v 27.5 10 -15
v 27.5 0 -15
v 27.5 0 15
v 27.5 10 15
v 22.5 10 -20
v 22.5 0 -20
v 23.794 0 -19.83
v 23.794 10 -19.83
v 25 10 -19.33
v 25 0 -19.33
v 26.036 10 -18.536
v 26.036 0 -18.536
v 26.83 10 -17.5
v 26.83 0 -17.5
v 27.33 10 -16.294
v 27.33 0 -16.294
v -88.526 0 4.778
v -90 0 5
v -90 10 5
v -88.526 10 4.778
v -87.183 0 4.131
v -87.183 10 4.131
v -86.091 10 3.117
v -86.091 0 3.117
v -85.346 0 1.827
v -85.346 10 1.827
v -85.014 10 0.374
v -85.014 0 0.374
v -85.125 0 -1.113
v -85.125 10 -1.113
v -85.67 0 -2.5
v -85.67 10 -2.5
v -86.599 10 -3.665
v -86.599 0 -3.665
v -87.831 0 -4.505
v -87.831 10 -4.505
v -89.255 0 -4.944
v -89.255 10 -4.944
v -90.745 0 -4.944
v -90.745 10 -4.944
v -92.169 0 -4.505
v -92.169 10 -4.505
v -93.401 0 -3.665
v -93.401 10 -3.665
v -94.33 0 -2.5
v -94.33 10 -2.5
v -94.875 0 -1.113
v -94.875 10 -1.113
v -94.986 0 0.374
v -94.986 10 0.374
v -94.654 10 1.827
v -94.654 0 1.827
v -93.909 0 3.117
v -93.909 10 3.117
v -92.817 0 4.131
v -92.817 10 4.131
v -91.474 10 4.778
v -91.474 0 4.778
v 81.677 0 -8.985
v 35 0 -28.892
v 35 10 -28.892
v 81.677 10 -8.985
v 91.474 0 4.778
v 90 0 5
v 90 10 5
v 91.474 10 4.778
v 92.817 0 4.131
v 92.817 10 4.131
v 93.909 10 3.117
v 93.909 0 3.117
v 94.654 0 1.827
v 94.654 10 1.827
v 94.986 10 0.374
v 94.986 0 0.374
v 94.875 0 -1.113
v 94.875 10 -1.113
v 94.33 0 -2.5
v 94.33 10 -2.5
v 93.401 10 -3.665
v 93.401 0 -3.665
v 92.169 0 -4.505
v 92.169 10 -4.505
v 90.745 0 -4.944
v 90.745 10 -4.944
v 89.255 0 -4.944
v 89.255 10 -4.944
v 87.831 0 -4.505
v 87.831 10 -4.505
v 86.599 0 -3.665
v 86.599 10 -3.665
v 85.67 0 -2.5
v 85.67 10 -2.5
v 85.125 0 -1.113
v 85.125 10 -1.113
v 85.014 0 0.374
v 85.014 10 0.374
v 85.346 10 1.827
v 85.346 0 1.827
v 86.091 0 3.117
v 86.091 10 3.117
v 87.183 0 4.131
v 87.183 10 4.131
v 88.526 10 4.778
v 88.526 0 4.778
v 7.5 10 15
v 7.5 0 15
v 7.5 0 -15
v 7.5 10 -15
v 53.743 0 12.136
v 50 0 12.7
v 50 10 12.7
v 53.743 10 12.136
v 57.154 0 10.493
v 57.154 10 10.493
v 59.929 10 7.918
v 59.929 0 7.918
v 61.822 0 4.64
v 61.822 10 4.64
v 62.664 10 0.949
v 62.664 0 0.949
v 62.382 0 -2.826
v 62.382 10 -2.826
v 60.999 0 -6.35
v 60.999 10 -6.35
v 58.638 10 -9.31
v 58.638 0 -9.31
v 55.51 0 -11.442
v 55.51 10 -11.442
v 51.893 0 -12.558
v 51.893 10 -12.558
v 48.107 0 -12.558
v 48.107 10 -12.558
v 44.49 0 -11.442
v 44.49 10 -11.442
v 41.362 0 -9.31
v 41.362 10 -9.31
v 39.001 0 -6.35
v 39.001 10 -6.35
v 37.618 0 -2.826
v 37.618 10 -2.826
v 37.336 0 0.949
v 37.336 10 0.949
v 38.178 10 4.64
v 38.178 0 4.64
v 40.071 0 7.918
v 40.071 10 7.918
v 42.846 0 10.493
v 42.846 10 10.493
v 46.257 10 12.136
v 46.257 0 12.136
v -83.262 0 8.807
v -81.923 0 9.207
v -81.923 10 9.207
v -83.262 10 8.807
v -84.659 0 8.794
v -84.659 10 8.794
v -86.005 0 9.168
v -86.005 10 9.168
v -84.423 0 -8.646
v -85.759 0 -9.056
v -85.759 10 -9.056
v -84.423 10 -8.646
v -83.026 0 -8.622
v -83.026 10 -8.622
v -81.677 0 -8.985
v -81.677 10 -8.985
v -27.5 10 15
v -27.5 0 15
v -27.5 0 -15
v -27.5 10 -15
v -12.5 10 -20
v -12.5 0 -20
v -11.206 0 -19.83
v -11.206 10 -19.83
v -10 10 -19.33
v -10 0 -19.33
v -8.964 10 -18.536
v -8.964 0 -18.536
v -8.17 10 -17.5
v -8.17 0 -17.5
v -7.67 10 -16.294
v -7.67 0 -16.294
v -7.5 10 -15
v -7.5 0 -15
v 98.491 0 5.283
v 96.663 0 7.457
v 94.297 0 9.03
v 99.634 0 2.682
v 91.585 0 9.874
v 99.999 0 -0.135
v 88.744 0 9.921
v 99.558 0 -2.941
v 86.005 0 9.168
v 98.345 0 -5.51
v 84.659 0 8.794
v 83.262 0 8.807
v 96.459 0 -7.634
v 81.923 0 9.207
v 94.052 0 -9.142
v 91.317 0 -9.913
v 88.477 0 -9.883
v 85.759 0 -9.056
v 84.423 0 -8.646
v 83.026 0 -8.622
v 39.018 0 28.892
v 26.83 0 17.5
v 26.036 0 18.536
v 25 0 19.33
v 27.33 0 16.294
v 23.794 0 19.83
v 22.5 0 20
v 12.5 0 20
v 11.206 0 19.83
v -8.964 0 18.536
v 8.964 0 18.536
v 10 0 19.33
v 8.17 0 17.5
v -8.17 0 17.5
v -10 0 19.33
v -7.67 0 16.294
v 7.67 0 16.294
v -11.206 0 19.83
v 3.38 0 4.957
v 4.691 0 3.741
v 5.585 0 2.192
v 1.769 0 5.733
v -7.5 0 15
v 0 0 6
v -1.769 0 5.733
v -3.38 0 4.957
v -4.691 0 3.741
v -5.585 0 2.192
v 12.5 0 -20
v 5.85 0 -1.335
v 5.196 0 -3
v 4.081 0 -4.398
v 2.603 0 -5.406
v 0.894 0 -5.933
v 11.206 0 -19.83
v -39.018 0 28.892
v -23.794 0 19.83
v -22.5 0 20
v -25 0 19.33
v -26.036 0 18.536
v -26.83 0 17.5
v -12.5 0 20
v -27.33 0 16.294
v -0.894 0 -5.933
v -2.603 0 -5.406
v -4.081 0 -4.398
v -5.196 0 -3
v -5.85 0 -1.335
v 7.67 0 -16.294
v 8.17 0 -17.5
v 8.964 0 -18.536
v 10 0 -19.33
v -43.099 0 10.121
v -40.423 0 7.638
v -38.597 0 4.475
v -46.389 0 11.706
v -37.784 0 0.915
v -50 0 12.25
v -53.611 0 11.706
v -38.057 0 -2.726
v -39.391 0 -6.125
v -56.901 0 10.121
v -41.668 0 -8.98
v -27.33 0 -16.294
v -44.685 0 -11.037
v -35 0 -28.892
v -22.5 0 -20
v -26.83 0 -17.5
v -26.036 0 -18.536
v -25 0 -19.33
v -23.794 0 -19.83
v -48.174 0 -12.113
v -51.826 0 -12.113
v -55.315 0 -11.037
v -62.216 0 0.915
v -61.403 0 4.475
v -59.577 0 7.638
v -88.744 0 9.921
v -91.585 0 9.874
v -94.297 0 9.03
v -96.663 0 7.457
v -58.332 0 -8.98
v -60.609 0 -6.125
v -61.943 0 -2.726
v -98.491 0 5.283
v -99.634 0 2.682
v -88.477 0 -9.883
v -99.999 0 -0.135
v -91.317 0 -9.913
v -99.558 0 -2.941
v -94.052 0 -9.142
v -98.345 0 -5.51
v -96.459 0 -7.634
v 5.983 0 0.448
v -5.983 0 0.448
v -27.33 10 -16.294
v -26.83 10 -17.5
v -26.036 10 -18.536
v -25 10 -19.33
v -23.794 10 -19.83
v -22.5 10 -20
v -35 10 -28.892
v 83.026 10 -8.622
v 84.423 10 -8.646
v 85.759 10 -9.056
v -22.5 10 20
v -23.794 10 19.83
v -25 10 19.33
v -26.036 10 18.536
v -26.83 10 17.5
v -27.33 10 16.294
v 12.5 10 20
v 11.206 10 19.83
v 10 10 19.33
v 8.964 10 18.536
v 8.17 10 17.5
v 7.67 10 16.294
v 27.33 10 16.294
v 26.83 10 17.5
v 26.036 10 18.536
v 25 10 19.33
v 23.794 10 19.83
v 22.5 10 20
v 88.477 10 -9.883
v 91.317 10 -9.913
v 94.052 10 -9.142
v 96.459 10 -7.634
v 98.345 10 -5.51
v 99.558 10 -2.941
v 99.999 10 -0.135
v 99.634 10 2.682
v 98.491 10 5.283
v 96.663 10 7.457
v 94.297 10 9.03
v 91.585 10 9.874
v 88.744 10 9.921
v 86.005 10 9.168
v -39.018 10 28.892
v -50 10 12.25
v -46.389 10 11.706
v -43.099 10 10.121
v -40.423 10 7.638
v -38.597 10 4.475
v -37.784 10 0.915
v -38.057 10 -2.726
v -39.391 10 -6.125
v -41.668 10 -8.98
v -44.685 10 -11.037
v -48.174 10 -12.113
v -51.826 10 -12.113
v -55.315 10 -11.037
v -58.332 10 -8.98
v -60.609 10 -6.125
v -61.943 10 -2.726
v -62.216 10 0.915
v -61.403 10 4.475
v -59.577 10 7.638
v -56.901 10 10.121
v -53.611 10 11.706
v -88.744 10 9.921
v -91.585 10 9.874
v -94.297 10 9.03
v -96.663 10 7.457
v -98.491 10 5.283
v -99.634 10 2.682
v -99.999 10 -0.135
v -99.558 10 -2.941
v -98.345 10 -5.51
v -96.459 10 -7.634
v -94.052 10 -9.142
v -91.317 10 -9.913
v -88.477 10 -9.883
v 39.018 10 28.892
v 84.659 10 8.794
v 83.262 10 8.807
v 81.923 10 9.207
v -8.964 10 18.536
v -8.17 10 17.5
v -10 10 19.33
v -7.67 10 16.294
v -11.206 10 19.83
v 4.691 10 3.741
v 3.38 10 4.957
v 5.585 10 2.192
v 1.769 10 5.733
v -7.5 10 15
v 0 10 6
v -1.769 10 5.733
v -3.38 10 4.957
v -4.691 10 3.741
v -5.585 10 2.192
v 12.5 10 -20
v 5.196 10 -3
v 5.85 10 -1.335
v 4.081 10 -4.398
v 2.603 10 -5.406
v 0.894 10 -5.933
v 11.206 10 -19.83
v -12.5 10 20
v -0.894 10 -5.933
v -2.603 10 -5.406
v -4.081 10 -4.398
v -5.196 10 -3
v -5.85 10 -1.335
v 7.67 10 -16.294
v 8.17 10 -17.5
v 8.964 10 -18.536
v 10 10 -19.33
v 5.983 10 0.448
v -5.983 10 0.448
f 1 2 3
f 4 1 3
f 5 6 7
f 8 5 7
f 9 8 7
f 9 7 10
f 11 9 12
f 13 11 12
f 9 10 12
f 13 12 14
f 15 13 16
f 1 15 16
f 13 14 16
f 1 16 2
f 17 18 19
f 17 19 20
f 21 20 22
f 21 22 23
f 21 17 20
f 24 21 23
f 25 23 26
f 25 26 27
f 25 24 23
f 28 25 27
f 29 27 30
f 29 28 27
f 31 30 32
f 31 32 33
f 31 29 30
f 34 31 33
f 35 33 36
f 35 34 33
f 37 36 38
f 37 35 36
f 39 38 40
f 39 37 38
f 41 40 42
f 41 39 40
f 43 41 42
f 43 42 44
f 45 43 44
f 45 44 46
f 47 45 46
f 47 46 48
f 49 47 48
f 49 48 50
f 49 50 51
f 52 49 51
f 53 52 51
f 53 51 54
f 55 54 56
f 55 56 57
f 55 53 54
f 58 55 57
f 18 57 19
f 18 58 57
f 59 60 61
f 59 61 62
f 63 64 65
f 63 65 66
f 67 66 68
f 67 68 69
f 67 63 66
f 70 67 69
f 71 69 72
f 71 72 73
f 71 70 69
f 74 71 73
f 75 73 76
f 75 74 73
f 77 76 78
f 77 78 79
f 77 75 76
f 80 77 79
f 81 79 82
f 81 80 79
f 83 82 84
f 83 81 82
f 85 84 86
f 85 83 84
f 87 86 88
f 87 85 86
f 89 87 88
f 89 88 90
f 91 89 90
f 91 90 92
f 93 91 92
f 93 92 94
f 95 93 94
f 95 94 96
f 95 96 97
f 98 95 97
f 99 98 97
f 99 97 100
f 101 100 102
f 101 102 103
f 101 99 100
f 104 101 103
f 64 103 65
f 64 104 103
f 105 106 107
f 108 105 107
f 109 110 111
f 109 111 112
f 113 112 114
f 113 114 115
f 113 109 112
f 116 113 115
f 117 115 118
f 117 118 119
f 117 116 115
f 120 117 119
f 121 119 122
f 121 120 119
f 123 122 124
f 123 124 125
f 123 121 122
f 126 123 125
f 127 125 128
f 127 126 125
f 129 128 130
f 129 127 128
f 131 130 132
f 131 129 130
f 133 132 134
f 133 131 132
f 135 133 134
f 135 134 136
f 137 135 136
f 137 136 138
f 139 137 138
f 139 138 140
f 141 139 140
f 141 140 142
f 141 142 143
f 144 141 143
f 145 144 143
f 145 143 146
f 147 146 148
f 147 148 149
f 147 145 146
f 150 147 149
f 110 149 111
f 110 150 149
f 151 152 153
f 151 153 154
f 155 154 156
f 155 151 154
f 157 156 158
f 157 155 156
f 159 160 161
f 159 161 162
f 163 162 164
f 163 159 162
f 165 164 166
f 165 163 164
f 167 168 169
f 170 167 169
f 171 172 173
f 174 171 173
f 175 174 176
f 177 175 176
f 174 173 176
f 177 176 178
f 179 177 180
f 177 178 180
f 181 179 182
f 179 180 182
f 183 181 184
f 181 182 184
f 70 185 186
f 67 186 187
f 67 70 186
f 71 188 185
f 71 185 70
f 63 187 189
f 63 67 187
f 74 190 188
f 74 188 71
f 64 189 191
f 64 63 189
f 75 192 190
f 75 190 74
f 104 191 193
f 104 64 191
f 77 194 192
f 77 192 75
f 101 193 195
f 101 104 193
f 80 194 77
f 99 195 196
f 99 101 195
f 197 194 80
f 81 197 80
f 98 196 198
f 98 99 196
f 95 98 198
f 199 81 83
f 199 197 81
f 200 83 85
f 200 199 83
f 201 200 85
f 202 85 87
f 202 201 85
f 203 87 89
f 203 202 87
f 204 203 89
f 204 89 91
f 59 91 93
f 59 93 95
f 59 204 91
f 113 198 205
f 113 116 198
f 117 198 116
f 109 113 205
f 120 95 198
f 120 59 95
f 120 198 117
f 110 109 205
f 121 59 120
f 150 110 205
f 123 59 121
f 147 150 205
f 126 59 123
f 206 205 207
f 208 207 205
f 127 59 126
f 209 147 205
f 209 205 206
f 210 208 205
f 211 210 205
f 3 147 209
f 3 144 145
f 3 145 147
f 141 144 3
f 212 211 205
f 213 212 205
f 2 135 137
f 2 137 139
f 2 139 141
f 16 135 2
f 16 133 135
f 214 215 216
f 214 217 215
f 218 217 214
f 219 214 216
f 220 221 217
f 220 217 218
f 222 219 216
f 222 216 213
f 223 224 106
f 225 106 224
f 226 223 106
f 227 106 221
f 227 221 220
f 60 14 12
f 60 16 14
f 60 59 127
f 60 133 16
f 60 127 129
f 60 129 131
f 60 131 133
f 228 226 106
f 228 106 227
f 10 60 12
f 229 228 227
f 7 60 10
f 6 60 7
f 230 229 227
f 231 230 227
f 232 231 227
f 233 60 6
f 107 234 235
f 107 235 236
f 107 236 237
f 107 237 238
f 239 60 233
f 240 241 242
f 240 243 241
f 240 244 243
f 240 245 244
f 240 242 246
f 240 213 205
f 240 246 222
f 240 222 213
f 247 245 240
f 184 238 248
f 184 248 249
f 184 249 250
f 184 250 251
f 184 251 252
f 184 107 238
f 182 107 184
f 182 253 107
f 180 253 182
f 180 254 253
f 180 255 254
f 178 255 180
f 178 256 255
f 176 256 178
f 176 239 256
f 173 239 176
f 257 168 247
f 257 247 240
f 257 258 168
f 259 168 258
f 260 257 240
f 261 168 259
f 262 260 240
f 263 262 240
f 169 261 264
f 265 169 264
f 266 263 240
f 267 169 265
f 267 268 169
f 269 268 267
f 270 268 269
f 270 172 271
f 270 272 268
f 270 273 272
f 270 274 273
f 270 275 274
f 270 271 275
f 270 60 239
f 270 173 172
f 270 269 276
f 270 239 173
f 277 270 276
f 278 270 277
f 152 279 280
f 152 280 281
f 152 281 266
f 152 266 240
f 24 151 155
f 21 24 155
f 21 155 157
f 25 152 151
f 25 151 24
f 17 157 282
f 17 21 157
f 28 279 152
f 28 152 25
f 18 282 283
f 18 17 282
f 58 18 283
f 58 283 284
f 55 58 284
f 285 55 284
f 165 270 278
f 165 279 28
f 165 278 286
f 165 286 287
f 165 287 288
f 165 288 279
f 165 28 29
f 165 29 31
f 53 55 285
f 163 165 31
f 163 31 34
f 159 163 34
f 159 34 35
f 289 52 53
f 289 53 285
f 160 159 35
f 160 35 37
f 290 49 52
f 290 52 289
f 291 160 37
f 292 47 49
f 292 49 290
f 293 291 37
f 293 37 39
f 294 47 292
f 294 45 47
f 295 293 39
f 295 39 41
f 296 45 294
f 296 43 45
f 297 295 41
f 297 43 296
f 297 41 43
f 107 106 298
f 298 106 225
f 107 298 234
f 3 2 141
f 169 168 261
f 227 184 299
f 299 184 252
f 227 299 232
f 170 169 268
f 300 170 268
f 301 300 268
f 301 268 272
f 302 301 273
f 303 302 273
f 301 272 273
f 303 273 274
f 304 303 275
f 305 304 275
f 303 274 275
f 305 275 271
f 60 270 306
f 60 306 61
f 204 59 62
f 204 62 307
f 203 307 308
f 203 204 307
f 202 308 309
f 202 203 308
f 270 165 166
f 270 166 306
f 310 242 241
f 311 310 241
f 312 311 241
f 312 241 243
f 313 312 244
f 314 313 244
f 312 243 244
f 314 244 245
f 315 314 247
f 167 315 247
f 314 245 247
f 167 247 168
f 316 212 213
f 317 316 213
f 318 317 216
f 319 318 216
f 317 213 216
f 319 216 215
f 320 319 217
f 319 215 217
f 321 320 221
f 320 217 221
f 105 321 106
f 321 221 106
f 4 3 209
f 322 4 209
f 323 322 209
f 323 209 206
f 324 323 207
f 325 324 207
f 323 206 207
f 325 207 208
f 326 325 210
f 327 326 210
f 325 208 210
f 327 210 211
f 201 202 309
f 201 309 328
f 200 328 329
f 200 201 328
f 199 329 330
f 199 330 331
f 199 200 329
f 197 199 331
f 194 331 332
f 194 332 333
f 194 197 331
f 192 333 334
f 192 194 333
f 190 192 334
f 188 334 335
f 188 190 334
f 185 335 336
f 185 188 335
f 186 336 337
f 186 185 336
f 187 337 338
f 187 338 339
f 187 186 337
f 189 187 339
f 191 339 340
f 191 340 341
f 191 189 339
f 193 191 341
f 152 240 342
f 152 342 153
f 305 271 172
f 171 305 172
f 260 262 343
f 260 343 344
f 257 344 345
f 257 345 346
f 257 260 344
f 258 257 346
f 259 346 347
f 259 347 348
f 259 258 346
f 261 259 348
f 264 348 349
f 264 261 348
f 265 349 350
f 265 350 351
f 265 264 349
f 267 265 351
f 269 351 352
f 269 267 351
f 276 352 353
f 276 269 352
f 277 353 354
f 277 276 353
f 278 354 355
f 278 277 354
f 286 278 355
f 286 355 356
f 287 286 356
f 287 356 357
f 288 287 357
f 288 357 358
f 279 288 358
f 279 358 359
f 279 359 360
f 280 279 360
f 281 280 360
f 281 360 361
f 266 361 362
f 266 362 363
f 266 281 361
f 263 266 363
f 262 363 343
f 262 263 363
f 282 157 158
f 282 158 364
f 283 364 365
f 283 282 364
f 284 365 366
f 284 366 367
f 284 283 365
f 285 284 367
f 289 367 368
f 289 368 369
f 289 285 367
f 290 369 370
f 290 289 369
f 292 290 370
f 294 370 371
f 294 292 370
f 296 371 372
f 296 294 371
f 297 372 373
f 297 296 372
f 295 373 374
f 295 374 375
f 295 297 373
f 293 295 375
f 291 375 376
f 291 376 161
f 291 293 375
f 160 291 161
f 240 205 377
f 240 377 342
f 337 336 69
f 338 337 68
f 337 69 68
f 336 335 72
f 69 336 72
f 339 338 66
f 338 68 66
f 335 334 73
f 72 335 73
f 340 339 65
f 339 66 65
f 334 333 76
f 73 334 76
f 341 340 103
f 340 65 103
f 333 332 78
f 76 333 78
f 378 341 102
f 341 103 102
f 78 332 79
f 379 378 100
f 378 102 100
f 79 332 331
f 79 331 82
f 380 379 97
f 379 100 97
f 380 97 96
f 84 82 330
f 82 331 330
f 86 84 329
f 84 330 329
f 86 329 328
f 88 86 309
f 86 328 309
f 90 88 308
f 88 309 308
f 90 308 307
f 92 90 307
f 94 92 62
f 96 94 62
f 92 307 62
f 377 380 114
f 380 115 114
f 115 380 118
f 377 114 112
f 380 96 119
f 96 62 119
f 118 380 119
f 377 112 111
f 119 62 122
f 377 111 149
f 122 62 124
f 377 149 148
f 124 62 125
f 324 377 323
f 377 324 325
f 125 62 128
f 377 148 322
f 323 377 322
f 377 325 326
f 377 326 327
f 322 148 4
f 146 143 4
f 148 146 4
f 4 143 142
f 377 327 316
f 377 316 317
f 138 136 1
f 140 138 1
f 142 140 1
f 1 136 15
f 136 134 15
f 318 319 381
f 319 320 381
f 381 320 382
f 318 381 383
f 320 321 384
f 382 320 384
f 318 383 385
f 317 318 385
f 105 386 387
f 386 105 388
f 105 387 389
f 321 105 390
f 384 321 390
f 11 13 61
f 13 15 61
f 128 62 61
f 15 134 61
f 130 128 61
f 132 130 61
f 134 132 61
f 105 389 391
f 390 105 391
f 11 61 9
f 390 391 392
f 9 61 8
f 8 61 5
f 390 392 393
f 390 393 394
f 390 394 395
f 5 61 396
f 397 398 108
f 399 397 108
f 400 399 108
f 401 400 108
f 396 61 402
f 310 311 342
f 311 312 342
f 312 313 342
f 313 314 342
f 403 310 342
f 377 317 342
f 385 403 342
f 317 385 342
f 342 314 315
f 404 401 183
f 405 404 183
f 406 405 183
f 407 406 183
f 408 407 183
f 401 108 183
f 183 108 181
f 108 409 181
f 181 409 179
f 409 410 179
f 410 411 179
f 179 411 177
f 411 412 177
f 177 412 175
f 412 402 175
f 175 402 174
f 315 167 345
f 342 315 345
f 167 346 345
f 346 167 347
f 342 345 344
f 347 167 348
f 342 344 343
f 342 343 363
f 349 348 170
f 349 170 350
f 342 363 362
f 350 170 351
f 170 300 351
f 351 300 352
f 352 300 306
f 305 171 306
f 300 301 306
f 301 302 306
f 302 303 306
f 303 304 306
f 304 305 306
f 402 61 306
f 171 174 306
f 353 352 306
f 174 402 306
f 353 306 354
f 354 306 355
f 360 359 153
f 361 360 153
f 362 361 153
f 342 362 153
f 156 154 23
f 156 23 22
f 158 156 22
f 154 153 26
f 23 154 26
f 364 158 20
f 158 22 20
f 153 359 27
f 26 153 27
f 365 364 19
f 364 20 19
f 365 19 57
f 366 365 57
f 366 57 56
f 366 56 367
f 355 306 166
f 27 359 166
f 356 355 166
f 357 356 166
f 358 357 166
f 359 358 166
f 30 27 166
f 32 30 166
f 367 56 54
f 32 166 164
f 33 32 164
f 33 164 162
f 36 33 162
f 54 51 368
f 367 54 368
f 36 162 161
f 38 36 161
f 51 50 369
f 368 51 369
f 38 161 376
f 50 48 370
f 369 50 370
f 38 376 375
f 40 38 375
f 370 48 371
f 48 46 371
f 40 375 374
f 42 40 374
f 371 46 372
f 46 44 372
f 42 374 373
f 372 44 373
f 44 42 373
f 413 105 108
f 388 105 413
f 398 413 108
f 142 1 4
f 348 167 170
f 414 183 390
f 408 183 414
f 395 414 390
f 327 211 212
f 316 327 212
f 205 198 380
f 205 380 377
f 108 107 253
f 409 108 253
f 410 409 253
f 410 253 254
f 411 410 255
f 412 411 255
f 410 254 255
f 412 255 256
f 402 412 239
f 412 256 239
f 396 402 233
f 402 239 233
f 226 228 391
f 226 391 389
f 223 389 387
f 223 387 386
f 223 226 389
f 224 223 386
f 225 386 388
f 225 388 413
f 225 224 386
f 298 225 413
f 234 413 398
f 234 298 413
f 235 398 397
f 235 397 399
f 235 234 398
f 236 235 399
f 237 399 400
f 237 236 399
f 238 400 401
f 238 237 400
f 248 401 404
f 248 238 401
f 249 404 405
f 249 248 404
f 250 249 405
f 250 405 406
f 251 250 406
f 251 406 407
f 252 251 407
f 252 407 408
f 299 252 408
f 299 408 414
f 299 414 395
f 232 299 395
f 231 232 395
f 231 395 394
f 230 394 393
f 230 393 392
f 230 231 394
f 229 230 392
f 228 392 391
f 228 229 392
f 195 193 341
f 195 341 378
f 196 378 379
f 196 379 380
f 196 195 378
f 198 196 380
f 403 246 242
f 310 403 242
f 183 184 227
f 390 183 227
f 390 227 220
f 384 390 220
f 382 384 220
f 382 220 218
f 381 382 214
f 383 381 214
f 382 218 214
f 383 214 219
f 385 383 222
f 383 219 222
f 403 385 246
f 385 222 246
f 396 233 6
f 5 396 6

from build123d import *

# Parameters (mm, degrees)
CROQUIS1_R              = 12.7
CROQUIS1_R_2            = 12.25
CROQUIS1_R_3            = 5
CROQUIS1_R_4            = 6
SALIENTE_EXTRUIR1_DEPTH = 10


with BuildPart() as part:
    # Croquis1 → Saliente-Extruir1 (new body)
    with BuildSketch(Plane(origin=(0, 0, 0), x_dir=(1, 0, 0), z_dir=(0, 1, 0))):
        with BuildLine():
            Line((-35, 28.891912333), (35, 28.891912333))
            Line((35, 28.891912333), (81.677313088, 8.985147888))
            ThreePointArc((81.677313088, 8.985147888), (83.725830982, 8.585112915), (85.759177009, 9.056236545))
            ThreePointArc((85.759177009, 9.056236545), (99.999086859, 0.13513694), (86.005469996, -9.167536749))
            ThreePointArc((86.005469996, -9.167536749), (83.960134549, -8.751536206), (81.923175769, -9.206786103))
            Line((81.923175769, -9.206786103), (39.017575448, -28.891912333))
            Line((39.017575448, -28.891912333), (-39.017575448, -28.891912333))
            Line((-39.017575448, -28.891912333), (-81.923175769, -9.206786103))
            ThreePointArc((-81.923175769, -9.206786103), (-83.960134549, -8.751536206), (-86.005469996, -9.167536749))
            ThreePointArc((-86.005469996, -9.167536749), (-99.999086859, 0.13513694), (-85.759177009, 9.056236545))
            ThreePointArc((-85.759177009, 9.056236545), (-83.725830982, 8.585112915), (-81.677313088, 8.985147888))
            Line((-81.677313088, 8.985147888), (-35, 28.891912333))
        make_face()
        with Locations(Location((50, 0, 0), (0, 0, 270))):
            Circle(CROQUIS1_R, mode=Mode.SUBTRACT)
        with Locations(Location((-50, 0, 0), (0, 0, 270))):
            Circle(CROQUIS1_R_2, mode=Mode.SUBTRACT)
        with Locations(Location((-90, 0, 0), (0, 0, 270))):
            Circle(CROQUIS1_R_3, mode=Mode.SUBTRACT)
        with Locations(Location((90, 0, 0), (0, 0, 270))):
            Circle(CROQUIS1_R_3, mode=Mode.SUBTRACT)
        with Locations(Location((0, 0, 0), (0, 0, 270))):
            Circle(CROQUIS1_R_4, mode=Mode.SUBTRACT)
        with BuildLine():
            Line((-22.5, 20), (-12.5, 20))
            ThreePointArc((-12.5, 20), (-8.964466094, 18.535533906), (-7.5, 15))
            Line((-7.5, 15), (-7.5, -15))
            ThreePointArc((-7.5, -15), (-8.964466094, -18.535533906), (-12.5, -20))
            Line((-12.5, -20), (-22.5, -20))
            ThreePointArc((-22.5, -20), (-26.035533906, -18.535533906), (-27.5, -15))
            Line((-27.5, -15), (-27.5, 15))
            ThreePointArc((-27.5, 15), (-26.035533906, 18.535533906), (-22.5, 20))
        make_face(mode=Mode.SUBTRACT)
        with BuildLine():
            Line((12.5, 20), (22.5, 20))
            ThreePointArc((22.5, 20), (26.035533906, 18.535533906), (27.5, 15))
            Line((27.5, 15), (27.5, -15))
            ThreePointArc((27.5, -15), (26.035533906, -18.535533906), (22.5, -20))
            Line((22.5, -20), (12.5, -20))
            ThreePointArc((12.5, -20), (8.964466094, -18.535533906), (7.5, -15))
            Line((7.5, -15), (7.5, 15))
            ThreePointArc((7.5, 15), (8.964466094, 18.535533906), (12.5, 20))
        make_face(mode=Mode.SUBTRACT)
    extrude(amount=SALIENTE_EXTRUIR1_DEPTH)


solid = part.part
